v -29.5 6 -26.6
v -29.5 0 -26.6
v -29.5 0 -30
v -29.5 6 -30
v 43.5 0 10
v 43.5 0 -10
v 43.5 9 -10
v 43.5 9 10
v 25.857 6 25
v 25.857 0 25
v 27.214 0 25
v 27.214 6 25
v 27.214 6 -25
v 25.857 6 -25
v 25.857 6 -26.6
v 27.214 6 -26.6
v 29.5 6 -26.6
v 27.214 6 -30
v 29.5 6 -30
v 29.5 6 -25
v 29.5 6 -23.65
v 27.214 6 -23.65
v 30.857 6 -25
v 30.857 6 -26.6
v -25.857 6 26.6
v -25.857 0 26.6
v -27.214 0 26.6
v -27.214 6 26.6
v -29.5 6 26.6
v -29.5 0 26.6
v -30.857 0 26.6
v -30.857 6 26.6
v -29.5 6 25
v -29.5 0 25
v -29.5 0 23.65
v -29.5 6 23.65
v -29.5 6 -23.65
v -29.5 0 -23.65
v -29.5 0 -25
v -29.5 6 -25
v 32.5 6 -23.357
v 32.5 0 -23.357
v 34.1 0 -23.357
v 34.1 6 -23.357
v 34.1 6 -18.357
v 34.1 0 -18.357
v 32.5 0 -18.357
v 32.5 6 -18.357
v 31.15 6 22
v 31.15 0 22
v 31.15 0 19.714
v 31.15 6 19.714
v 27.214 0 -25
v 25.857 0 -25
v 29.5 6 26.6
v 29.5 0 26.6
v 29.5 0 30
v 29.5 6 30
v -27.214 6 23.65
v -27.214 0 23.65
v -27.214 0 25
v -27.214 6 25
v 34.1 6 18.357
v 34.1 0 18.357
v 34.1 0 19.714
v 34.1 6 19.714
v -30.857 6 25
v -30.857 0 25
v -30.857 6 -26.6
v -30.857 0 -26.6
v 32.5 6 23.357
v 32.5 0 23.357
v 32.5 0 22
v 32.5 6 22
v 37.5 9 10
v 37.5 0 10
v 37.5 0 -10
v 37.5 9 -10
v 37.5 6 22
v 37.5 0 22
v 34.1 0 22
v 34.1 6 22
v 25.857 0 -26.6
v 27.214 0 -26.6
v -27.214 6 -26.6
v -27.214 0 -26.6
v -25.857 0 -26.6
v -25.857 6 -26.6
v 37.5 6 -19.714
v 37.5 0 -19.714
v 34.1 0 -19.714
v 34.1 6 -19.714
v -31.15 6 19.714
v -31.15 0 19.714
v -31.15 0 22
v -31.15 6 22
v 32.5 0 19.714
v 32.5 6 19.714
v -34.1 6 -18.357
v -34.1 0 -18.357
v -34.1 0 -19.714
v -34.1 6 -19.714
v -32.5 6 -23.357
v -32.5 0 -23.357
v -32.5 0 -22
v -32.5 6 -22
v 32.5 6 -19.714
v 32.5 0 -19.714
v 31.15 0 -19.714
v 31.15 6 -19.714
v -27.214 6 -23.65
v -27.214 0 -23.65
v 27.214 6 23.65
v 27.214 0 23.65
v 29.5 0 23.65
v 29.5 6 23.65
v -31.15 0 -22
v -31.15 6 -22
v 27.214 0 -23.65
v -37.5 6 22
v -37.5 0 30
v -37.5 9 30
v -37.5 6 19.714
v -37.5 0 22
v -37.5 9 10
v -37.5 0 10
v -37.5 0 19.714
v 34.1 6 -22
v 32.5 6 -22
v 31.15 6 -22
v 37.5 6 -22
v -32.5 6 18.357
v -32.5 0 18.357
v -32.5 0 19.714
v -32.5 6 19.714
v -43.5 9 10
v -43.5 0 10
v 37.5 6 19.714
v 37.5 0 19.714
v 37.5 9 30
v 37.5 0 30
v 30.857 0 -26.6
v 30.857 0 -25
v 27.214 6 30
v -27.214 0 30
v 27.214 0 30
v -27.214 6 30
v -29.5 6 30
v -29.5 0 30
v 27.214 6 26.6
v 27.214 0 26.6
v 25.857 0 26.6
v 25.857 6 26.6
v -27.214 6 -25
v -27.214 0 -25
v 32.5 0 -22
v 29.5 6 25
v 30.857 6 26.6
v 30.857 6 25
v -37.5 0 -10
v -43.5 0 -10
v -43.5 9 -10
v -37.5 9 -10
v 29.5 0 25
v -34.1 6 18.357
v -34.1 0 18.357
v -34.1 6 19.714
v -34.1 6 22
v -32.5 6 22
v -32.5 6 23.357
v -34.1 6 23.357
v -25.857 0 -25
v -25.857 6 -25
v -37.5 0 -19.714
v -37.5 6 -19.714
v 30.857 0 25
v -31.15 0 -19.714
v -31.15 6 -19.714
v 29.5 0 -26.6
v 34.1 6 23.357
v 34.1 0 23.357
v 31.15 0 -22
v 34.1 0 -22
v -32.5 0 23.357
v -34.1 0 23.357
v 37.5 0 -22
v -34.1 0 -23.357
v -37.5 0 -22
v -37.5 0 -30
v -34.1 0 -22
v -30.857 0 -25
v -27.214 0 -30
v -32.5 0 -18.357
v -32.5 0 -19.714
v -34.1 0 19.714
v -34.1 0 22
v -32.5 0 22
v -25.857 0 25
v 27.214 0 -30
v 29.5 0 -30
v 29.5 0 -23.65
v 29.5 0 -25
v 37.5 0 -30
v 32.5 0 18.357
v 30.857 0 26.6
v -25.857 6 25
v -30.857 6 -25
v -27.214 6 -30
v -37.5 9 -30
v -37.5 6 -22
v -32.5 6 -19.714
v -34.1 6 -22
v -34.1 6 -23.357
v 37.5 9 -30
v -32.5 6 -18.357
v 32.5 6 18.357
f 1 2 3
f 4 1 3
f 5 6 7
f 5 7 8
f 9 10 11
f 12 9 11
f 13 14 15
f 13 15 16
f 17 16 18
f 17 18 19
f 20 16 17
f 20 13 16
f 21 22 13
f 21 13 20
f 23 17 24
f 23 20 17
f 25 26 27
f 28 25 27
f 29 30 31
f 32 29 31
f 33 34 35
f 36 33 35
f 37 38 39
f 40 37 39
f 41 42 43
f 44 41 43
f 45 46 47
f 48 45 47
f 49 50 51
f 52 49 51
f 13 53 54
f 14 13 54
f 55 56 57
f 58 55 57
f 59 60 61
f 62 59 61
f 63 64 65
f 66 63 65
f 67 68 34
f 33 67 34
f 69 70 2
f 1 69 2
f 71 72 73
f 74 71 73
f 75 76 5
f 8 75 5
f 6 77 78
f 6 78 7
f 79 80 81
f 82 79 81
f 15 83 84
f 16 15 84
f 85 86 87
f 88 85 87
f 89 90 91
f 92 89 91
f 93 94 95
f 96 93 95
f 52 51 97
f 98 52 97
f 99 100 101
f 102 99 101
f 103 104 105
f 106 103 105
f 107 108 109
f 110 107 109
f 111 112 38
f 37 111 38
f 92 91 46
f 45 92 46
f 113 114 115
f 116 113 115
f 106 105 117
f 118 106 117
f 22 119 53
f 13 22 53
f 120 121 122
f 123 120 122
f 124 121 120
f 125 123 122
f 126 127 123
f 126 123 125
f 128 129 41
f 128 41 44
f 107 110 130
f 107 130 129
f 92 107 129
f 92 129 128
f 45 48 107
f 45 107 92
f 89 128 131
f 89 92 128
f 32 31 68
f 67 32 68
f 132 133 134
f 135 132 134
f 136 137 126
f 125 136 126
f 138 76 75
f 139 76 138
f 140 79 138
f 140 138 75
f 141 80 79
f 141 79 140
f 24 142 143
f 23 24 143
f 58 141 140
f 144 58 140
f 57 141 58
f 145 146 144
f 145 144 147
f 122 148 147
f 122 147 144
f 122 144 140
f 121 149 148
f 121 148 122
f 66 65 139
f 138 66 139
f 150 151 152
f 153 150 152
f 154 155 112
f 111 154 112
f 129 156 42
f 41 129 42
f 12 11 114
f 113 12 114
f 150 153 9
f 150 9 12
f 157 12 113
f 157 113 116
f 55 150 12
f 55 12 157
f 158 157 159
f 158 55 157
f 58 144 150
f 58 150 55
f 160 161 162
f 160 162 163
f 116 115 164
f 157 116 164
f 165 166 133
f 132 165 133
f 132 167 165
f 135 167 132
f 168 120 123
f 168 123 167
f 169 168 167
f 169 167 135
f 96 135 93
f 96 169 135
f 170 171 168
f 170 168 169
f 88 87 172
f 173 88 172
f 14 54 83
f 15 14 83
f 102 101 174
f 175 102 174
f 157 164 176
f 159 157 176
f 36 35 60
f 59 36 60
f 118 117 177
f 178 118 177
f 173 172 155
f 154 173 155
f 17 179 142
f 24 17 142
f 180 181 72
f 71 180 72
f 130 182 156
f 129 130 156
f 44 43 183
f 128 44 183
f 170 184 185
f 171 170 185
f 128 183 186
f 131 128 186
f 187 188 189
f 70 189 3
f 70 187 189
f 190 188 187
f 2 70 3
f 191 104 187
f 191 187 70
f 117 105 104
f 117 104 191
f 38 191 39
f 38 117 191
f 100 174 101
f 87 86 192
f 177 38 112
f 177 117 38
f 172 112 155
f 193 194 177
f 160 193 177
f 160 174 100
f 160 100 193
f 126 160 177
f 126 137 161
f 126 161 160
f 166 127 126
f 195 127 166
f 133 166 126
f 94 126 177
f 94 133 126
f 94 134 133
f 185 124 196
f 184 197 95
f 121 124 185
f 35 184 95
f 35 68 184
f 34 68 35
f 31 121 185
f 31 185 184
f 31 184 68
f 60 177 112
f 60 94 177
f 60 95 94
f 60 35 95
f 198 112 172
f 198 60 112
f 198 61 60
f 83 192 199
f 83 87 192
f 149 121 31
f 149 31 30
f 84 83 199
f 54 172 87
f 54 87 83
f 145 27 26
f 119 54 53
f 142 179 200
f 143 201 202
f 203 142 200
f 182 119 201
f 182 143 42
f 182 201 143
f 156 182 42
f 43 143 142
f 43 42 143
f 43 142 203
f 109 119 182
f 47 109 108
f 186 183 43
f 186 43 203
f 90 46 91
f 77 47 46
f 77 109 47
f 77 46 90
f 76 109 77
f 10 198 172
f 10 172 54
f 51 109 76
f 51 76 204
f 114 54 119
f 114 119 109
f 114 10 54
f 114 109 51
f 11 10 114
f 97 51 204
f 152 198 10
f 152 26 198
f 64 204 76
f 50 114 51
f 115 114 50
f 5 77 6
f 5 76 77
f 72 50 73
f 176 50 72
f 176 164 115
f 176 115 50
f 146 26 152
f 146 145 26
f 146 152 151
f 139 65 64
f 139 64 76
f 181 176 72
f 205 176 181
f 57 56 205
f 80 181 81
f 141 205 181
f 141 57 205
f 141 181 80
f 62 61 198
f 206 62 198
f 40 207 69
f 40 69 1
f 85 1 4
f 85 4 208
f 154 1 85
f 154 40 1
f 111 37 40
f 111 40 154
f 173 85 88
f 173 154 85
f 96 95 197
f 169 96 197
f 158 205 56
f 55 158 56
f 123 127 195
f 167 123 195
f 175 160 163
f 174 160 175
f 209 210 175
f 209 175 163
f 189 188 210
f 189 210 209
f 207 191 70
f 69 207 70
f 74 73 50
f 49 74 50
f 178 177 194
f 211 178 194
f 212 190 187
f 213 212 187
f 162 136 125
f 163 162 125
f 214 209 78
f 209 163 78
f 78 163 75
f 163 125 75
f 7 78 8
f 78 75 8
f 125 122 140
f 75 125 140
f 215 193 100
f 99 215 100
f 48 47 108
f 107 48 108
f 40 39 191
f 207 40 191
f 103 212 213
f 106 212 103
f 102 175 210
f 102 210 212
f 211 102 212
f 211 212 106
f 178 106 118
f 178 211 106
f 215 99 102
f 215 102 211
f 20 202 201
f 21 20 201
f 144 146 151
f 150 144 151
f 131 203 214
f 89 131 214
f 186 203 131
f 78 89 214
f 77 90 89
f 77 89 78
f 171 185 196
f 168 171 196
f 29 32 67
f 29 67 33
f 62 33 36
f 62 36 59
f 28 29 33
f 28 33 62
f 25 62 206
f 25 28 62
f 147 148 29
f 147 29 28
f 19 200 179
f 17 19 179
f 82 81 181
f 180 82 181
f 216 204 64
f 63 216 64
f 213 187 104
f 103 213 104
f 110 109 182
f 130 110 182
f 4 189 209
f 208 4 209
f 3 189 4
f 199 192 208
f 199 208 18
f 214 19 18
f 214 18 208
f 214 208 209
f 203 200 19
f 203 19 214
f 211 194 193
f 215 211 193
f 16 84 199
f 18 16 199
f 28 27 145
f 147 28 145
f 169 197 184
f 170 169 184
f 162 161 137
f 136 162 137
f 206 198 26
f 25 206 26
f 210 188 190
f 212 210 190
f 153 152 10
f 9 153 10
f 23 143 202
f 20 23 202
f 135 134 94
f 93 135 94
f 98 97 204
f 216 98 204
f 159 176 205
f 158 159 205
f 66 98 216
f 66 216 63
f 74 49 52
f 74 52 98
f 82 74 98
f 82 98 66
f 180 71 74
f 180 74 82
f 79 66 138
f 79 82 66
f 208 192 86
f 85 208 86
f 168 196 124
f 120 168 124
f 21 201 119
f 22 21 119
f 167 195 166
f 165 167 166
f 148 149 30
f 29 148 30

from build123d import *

# Parameters (mm, degrees)
F0_W     = 6
F0_H     = 20
F1_DEPTH = 9
F2_DEPTH = 6


with BuildPart() as f1:
    # F0 (on Front) → F1 (new body)
    with BuildSketch(Plane.XZ):
        Polygon((-37.5, -22), (-37.5, -30), (-29.5, -30), (-29.5, -26.6002), (-30.857, -26.6002), (-30.857, -25), (-29.5, -25), (-29.5, -23.65), (-27.214, -23.65), (-27.214, -25), (-25.857, -25), (-25.857, -26.6002), (-27.214, -26.6002), (-27.214, -30), (27.214, -30), (27.214, -26.6002), (25.857, -26.6002), (25.857, -25), (27.214, -25), (27.214, -23.65), (29.5, -23.65), (29.5, -25), (30.857, -25), (30.857, -26.6002), (29.5, -26.6002), (29.5, -30), (37.5, -30), (37.5, -22), (34.1002, -22), (34.1002, -23.357), (32.5, -23.357), (32.5, -22), (31.15, -22), (31.15, -19.714), (32.5, -19.714), (32.5, -18.357), (34.1002, -18.357), (34.1002, -19.714), (37.5, -19.714), (37.5, -10), (37.5, 10), (37.5, 19.714), (34.1002, 19.714), (34.1002, 18.357), (32.5, 18.357), (32.5, 19.714), (31.15, 19.714), (31.15, 22), (32.5, 22), (32.5, 23.357), (34.1002, 23.357), (34.1002, 22), (37.5, 22), (37.5, 30), (29.5, 30), (29.5, 26.6002), (30.857, 26.6002), (30.857, 25), (29.5, 25), (29.5, 23.65), (27.214, 23.65), (27.214, 25), (25.857, 25), (25.857, 26.6002), (27.214, 26.6002), (27.214, 30), (-27.214, 30), (-27.214, 26.6002), (-25.857, 26.6002), (-25.857, 25), (-27.214, 25), (-27.214, 23.65), (-29.5, 23.65), (-29.5, 25), (-30.857, 25), (-30.857, 26.6002), (-29.5, 26.6002), (-29.5, 30), (-37.5, 30), (-37.5, 22), (-34.1002, 22), (-34.1002, 23.357), (-32.5, 23.357), (-32.5, 22), (-31.15, 22), (-31.15, 19.714), (-32.5, 19.714), (-32.5, 18.357), (-34.1002, 18.357), (-34.1002, 19.714), (-37.5, 19.714), (-37.5, 10), (-37.5, -10), (-37.5, -19.714), (-34.1002, -19.714), (-34.1002, -18.357), (-32.5, -18.357), (-32.5, -19.714), (-31.15, -19.714), (-31.15, -22), (-32.5, -22), (-32.5, -23.357), (-34.1002, -23.357), (-34.1002, -22), align=None)
        Polygon((-29.5, -26.6002), (-29.5, -30), (-27.214, -30), (-27.214, -26.6002), (-25.857, -26.6002), (-25.857, -25), (-27.214, -25), (-27.214, -23.65), (-29.5, -23.65), (-29.5, -25), (-30.857, -25), (-30.857, -26.6002), align=None)
        Polygon((-37.5, -19.714), (-37.5, -22), (-34.1002, -22), (-34.1002, -23.357), (-32.5, -23.357), (-32.5, -22), (-31.15, -22), (-31.15, -19.714), (-32.5, -19.714), (-32.5, -18.357), (-34.1002, -18.357), (-34.1002, -19.714), align=None)
        Polygon((27.214, -26.6002), (27.214, -30), (29.5, -30), (29.5, -26.6002), (30.857, -26.6002), (30.857, -25), (29.5, -25), (29.5, -23.65), (27.214, -23.65), (27.214, -25), (25.857, -25), (25.857, -26.6002), align=None)
        with Locations((-40.5, 0)):
            Rectangle(F0_W, F0_H)
        Polygon((-37.5, 22), (-37.5, 19.714), (-34.1002, 19.714), (-34.1002, 18.357), (-32.5, 18.357), (-32.5, 19.714), (-31.15, 19.714), (-31.15, 22), (-32.5, 22), (-32.5, 23.357), (-34.1002, 23.357), (-34.1002, 22), align=None)
        Polygon((34.1002, -22), (37.5, -22), (37.5, -19.714), (34.1002, -19.714), (34.1002, -18.357), (32.5, -18.357), (32.5, -19.714), (31.15, -19.714), (31.15, -22), (32.5, -22), (32.5, -23.357), (34.1002, -23.357), align=None)
        with Locations((40.5, 0)):
            Rectangle(F0_W, F0_H)
        Polygon((-27.214, 30), (-29.5, 30), (-29.5, 26.6002), (-30.857, 26.6002), (-30.857, 25), (-29.5, 25), (-29.5, 23.65), (-27.214, 23.65), (-27.214, 25), (-25.857, 25), (-25.857, 26.6002), (-27.214, 26.6002), align=None)
        Polygon((34.1002, 19.714), (37.5, 19.714), (37.5, 22), (34.1002, 22), (34.1002, 23.357), (32.5, 23.357), (32.5, 22), (31.15, 22), (31.15, 19.714), (32.5, 19.714), (32.5, 18.357), (34.1002, 18.357), align=None)
        Polygon((29.5, 30), (27.214, 30), (27.214, 26.6002), (25.857, 26.6002), (25.857, 25), (27.214, 25), (27.214, 23.65), (29.5, 23.65), (29.5, 25), (30.857, 25), (30.857, 26.6002), (29.5, 26.6002), align=None)
    extrude(amount=-F1_DEPTH)

    # F0 (on Front) → F2 (cut)
    with BuildSketch(Plane.XZ):
        Polygon((-37.5, 22), (-37.5, 19.714), (-34.1002, 19.714), (-34.1002, 18.357), (-32.5, 18.357), (-32.5, 19.714), (-31.15, 19.714), (-31.15, 22), (-32.5, 22), (-32.5, 23.357), (-34.1002, 23.357), (-34.1002, 22), align=None)
        Polygon((-27.214, 30), (-29.5, 30), (-29.5, 26.6002), (-30.857, 26.6002), (-30.857, 25), (-29.5, 25), (-29.5, 23.65), (-27.214, 23.65), (-27.214, 25), (-25.857, 25), (-25.857, 26.6002), (-27.214, 26.6002), align=None)
        Polygon((-37.5, -19.714), (-37.5, -22), (-34.1002, -22), (-34.1002, -23.357), (-32.5, -23.357), (-32.5, -22), (-31.15, -22), (-31.15, -19.714), (-32.5, -19.714), (-32.5, -18.357), (-34.1002, -18.357), (-34.1002, -19.714), align=None)
        Polygon((-29.5, -26.6002), (-29.5, -30), (-27.214, -30), (-27.214, -26.6002), (-25.857, -26.6002), (-25.857, -25), (-27.214, -25), (-27.214, -23.65), (-29.5, -23.65), (-29.5, -25), (-30.857, -25), (-30.857, -26.6002), align=None)
        Polygon((27.214, -26.6002), (27.214, -30), (29.5, -30), (29.5, -26.6002), (30.857, -26.6002), (30.857, -25), (29.5, -25), (29.5, -23.65), (27.214, -23.65), (27.214, -25), (25.857, -25), (25.857, -26.6002), align=None)
        Polygon((34.1002, -22), (37.5, -22), (37.5, -19.714), (34.1002, -19.714), (34.1002, -18.357), (32.5, -18.357), (32.5, -19.714), (31.15, -19.714), (31.15, -22), (32.5, -22), (32.5, -23.357), (34.1002, -23.357), align=None)
        Polygon((34.1002, 19.714), (37.5, 19.714), (37.5, 22), (34.1002, 22), (34.1002, 23.357), (32.5, 23.357), (32.5, 22), (31.15, 22), (31.15, 19.714), (32.5, 19.714), (32.5, 18.357), (34.1002, 18.357), align=None)
        Polygon((29.5, 30), (27.214, 30), (27.214, 26.6002), (25.857, 26.6002), (25.857, 25), (27.214, 25), (27.214, 23.65), (29.5, 23.65), (29.5, 25), (30.857, 25), (30.857, 26.6002), (29.5, 26.6002), align=None)
    extrude(amount=-F2_DEPTH, mode=Mode.SUBTRACT)


solid = f1.part
